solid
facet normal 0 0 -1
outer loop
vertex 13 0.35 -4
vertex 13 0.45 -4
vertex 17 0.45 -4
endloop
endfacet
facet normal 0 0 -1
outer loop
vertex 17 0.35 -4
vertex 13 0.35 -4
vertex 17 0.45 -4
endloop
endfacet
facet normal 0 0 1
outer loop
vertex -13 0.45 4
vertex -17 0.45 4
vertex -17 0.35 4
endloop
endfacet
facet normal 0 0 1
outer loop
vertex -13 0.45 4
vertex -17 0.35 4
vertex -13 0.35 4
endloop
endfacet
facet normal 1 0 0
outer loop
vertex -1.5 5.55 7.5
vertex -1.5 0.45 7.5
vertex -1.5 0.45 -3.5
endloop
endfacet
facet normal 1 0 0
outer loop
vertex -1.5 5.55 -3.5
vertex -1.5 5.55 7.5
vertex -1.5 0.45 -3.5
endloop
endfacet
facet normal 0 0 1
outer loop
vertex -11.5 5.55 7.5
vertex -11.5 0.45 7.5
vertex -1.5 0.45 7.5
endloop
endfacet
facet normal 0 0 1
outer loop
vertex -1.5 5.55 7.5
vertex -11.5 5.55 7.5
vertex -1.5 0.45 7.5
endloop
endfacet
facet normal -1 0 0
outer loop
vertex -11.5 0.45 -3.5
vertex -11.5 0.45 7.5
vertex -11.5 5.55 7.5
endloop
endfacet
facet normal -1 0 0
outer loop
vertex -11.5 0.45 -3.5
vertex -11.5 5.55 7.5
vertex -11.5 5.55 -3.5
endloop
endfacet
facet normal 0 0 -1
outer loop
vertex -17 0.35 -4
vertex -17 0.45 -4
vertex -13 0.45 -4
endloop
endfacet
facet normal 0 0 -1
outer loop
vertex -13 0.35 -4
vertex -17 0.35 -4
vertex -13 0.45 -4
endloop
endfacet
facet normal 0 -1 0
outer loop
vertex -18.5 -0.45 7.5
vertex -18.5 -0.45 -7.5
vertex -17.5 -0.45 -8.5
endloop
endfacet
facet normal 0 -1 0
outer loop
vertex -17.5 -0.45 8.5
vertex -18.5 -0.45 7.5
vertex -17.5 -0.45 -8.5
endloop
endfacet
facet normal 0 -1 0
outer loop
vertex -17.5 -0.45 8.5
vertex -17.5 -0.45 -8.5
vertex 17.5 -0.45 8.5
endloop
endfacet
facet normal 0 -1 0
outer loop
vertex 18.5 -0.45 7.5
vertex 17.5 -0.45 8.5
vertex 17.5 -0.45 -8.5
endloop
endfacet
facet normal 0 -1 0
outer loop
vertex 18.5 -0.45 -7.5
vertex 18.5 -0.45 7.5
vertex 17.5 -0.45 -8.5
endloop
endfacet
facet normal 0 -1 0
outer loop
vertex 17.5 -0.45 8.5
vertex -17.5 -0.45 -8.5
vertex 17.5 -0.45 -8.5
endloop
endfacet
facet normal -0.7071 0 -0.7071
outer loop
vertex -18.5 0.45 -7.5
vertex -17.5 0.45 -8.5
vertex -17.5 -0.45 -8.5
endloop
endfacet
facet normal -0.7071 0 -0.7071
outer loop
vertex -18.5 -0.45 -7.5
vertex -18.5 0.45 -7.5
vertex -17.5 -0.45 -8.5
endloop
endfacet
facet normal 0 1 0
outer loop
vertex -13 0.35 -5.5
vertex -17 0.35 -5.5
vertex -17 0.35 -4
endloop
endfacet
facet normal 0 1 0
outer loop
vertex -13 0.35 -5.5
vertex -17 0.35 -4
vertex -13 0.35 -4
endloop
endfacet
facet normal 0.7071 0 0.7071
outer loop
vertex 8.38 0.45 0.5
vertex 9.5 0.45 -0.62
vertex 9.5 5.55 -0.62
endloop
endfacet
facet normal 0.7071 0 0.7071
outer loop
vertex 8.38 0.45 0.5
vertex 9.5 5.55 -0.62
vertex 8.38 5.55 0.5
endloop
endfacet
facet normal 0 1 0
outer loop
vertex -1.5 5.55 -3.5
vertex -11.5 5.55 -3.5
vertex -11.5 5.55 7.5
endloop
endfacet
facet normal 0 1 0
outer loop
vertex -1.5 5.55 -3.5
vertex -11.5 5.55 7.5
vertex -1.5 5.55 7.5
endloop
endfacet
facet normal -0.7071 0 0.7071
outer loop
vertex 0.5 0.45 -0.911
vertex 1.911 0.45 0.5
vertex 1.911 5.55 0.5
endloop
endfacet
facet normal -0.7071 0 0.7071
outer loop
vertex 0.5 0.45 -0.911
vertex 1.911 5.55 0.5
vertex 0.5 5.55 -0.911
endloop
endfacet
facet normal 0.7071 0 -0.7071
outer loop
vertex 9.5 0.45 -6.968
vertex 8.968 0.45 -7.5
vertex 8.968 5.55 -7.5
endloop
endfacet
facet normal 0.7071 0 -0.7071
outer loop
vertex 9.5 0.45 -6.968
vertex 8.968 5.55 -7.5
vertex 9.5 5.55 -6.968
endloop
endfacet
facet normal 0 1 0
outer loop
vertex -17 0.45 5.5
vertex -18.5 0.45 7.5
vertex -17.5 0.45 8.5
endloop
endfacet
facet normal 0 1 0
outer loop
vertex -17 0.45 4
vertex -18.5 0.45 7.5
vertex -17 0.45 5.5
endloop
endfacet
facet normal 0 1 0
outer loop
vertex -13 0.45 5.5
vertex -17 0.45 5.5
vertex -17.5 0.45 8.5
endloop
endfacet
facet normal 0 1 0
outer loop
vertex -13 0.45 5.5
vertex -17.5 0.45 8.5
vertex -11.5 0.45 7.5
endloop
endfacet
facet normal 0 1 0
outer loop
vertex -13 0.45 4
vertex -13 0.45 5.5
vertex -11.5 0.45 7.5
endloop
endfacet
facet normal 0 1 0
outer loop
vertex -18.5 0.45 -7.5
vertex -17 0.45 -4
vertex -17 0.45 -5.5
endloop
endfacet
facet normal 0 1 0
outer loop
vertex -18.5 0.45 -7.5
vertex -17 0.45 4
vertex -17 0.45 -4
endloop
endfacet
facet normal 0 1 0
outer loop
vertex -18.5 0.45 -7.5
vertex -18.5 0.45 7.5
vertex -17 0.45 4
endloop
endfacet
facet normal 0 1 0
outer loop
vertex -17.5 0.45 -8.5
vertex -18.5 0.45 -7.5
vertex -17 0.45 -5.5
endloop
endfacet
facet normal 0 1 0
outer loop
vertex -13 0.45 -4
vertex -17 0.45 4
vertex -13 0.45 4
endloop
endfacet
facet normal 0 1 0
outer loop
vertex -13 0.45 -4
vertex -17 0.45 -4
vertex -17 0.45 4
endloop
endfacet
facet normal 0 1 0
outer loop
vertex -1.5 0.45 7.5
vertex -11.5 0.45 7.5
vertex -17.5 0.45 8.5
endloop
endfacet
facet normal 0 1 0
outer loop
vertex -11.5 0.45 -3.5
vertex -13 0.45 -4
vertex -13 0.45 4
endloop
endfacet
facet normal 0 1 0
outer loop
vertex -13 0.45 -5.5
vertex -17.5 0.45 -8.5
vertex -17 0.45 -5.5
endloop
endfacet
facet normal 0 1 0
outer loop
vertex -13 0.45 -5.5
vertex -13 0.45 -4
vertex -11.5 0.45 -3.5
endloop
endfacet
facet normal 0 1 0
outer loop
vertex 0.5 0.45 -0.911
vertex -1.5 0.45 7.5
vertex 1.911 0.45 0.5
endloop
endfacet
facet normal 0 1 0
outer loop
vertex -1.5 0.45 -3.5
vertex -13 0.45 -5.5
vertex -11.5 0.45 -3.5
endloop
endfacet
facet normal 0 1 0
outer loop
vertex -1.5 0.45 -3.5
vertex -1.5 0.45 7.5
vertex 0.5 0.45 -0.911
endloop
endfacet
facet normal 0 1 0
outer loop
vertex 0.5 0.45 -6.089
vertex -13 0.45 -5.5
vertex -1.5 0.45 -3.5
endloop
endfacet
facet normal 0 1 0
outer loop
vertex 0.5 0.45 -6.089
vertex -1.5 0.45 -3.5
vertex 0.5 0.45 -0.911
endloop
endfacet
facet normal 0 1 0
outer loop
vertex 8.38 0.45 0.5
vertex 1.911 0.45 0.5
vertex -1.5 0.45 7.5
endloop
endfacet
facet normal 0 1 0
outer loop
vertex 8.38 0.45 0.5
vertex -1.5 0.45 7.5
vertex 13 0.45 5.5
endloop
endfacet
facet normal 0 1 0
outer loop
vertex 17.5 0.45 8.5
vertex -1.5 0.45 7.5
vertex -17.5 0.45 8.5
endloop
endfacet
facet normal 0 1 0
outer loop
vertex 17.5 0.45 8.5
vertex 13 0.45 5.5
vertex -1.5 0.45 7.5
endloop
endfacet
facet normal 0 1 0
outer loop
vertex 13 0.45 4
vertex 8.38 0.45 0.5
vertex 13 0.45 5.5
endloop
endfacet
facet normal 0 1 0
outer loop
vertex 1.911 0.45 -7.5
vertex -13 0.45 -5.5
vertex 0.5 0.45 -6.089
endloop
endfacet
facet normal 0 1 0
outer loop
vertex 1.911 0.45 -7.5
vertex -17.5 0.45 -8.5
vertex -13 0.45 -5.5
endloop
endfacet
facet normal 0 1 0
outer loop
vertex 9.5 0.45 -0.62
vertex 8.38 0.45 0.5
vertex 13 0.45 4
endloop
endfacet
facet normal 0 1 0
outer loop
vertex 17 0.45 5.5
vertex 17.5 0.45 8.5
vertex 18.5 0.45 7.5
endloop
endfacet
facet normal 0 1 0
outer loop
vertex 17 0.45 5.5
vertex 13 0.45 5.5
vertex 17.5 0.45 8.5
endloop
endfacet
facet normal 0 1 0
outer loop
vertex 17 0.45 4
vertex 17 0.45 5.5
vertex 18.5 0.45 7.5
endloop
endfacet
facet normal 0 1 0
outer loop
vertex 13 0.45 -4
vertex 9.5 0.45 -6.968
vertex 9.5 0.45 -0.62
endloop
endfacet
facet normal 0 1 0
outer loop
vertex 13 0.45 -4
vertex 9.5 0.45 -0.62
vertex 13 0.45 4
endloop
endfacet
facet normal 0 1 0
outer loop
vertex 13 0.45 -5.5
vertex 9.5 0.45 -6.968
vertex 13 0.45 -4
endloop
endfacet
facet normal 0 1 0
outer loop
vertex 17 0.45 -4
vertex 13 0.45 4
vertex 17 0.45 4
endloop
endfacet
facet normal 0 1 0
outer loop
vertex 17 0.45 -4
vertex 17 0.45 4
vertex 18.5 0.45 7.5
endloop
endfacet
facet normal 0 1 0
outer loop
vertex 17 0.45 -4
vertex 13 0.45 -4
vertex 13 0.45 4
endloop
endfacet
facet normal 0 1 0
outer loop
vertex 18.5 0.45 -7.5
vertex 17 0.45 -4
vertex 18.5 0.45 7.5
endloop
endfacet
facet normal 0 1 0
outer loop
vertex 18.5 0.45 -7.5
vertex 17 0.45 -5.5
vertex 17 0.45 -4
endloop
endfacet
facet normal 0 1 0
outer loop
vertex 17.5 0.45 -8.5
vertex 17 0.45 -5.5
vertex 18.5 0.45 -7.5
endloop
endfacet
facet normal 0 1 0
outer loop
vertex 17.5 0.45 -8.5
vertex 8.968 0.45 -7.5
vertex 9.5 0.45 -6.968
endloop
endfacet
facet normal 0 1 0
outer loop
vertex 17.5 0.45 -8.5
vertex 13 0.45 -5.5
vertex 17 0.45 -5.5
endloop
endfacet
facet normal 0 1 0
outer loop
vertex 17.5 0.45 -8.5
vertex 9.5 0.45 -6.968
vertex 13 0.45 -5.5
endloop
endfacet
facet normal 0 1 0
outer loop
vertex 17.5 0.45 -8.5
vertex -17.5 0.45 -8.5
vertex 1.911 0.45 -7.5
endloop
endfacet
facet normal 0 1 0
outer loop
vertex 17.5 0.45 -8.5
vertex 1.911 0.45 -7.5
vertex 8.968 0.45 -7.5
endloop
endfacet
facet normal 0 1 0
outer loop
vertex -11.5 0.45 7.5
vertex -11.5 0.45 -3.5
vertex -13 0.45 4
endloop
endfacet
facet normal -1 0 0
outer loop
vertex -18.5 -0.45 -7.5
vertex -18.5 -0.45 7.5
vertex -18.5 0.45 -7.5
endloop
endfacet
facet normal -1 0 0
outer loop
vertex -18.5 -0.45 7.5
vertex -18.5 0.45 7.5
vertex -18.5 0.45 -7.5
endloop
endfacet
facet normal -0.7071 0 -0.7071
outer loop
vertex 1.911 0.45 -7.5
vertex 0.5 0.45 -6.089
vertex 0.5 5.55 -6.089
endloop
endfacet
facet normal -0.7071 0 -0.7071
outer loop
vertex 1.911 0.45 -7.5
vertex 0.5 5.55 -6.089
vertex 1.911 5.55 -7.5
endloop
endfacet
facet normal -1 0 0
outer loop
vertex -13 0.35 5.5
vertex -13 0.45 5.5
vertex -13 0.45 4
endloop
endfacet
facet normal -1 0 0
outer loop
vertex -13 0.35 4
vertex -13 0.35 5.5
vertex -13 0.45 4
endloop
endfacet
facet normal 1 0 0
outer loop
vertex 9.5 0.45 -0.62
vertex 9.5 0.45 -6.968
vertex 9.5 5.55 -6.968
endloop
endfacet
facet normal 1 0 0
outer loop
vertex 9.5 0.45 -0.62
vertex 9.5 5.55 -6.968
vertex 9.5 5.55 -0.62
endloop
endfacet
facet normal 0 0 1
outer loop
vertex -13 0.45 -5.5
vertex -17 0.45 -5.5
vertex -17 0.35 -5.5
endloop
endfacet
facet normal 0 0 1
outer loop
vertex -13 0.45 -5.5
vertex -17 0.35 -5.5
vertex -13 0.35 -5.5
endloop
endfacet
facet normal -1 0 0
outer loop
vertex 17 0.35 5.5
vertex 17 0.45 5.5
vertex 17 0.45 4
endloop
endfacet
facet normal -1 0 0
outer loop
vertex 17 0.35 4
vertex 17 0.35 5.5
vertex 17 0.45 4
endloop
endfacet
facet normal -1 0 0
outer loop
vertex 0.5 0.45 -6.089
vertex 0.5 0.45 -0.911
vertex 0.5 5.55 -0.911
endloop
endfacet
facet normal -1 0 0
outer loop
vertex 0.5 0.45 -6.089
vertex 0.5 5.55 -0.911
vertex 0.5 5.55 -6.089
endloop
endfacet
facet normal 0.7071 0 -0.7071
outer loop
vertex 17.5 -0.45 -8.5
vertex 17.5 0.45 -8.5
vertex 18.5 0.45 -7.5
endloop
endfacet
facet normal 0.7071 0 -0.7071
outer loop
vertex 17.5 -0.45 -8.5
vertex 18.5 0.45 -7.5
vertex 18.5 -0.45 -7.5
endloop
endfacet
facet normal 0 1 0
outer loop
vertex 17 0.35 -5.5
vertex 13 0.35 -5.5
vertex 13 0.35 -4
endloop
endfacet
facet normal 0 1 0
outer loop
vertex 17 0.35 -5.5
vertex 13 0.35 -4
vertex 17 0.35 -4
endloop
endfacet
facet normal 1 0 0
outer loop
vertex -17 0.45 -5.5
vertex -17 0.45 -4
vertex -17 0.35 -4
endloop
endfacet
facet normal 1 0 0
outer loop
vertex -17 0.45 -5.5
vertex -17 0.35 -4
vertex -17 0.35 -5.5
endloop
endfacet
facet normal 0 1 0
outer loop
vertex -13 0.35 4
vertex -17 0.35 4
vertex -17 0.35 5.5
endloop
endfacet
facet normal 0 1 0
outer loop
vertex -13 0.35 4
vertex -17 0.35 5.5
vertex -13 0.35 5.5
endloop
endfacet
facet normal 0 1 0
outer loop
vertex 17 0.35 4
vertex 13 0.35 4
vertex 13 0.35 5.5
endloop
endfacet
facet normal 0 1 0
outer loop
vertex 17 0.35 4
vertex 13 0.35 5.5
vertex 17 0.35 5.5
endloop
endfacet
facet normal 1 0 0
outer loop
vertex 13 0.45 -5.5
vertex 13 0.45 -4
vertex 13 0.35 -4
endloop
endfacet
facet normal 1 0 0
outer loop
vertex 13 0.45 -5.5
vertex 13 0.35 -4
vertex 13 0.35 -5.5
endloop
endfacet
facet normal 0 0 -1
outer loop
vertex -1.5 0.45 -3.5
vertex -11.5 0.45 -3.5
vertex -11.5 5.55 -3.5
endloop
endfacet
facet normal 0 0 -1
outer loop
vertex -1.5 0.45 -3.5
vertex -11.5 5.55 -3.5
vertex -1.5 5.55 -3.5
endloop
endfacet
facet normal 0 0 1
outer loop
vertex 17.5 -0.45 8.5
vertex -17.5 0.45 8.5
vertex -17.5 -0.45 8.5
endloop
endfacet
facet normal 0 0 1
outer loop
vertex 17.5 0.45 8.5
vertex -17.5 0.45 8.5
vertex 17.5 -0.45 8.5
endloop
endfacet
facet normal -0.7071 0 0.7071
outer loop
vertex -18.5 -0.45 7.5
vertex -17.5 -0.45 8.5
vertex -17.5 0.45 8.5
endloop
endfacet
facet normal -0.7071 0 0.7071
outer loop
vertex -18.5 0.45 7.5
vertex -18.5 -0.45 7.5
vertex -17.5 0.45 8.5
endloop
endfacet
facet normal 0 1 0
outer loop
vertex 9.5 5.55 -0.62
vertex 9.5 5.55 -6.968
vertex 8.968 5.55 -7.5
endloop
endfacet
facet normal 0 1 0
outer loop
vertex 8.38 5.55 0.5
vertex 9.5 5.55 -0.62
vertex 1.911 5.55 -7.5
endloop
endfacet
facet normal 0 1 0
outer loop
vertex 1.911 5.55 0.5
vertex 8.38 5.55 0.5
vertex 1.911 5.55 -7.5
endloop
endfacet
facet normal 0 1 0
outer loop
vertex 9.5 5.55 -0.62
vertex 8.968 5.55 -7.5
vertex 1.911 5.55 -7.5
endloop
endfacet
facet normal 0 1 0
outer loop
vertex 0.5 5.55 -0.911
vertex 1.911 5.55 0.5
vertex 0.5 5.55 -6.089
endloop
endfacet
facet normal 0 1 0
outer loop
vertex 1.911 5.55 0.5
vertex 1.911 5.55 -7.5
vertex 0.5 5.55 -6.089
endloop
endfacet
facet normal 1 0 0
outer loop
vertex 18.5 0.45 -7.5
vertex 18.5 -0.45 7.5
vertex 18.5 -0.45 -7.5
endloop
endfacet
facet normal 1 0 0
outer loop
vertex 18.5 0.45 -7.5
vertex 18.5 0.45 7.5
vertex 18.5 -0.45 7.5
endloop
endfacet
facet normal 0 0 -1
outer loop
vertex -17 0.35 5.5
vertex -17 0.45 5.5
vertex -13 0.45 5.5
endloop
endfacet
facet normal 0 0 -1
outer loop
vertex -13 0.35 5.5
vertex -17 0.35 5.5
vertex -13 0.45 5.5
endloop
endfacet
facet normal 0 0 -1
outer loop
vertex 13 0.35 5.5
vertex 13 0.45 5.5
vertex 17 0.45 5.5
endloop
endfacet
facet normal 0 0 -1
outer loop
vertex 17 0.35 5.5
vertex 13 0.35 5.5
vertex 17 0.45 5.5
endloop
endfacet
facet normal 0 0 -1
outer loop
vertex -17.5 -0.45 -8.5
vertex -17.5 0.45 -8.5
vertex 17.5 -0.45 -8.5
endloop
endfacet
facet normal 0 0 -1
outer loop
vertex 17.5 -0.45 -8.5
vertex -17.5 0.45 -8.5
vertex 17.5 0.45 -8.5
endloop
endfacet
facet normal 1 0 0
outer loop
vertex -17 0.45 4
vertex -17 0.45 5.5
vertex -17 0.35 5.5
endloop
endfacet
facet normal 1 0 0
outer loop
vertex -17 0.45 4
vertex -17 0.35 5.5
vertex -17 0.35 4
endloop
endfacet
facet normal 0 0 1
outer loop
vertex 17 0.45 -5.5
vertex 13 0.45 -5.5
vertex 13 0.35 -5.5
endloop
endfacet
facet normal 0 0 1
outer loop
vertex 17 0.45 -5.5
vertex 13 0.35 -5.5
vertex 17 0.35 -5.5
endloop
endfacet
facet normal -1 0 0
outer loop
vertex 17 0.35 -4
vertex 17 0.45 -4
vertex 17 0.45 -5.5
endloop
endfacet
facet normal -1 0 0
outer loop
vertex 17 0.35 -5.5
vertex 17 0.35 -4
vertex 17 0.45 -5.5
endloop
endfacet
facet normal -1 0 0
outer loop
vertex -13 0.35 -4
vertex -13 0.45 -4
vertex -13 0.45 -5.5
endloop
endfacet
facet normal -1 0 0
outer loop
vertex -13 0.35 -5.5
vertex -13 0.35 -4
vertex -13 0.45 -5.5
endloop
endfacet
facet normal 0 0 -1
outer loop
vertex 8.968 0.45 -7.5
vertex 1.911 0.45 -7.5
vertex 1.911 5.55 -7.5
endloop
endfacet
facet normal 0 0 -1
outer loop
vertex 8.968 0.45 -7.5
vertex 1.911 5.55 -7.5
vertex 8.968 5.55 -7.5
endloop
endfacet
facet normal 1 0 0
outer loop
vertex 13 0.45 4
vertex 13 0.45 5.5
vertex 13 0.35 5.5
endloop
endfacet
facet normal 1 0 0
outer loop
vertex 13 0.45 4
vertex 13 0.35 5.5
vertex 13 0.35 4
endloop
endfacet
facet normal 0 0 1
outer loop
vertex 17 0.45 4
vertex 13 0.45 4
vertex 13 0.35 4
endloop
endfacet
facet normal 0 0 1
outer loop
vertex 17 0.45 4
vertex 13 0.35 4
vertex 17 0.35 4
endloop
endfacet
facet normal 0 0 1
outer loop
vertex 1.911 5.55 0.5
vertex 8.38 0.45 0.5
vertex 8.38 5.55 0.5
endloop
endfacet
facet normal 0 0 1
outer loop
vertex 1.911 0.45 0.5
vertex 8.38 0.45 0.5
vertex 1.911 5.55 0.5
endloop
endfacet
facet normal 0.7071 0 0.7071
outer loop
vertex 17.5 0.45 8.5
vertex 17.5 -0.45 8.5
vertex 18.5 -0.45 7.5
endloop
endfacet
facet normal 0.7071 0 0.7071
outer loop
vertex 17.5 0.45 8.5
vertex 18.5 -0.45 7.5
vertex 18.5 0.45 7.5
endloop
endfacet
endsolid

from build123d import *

# Parameters (mm, degrees)
ESBO_O1_W                = 37
ESBO_O1_H                = 17
RESSALTO_EXTRUS_O1_DEPTH = 0.45
ESBO_O2_W                = 10
ESBO_O2_H                = 11
RESSALTO_EXTRUS_O2_DEPTH = 5.1
RESSALTO_EXTRUS_O3_DEPTH = 5.1
ESBO_O4_W                = 4
ESBO_O4_H                = 1.5
CORTE_EXTRUS_O1_DEPTH    = 0.1
CHANFRO1_SIZE            = 1


with BuildPart() as part:
    # Esboço1 → Ressalto-extrusão1 (new, symmetric)
    with BuildSketch(Plane(origin=(0, 0, 0), x_dir=(1, 0, 0), z_dir=(0, 1, 0))):
        Rectangle(ESBO_O1_W, ESBO_O1_H)
    extrude(amount=RESSALTO_EXTRUS_O1_DEPTH, both=True)

    # Esboço2 → Ressalto-extrusão2 (add)
    with BuildSketch(Plane(origin=(0, 0.45, 0), x_dir=(1, 0, 0), z_dir=(0, 1, 0))):
        with Locations((-6.5, -2)):
            Rectangle(ESBO_O2_W, ESBO_O2_H)
    extrude(amount=RESSALTO_EXTRUS_O2_DEPTH)

    # Esboço3 → Ressalto-extrusão3 (add)
    with BuildSketch(Plane(origin=(0, 0.45, 0), x_dir=(1, 0, 0), z_dir=(0, 1, 0))):
        Polygon((0.5, 0.910833496), (0.5, 6.089166504), (1.910833496, 7.5), (8.967936907, 7.5), (9.5, 6.967936907), (9.5, 0.62041406), (8.37958594, -0.5), (1.910833496, -0.5), align=None)
    extrude(amount=RESSALTO_EXTRUS_O3_DEPTH)

    # Esboço4 → Corte-extrusão1 (cut)
    with BuildSketch(Plane(origin=(0, 0.45, 0), x_dir=(1, 0, 0), z_dir=(0, 1, 0))):
        with Locations((-15, 4.75)):
            Rectangle(ESBO_O4_W, ESBO_O4_H)
        with Locations((-15, -4.75)):
            Rectangle(ESBO_O4_W, ESBO_O4_H)
        with Locations((15, -4.75)):
            Rectangle(ESBO_O4_W, ESBO_O4_H)
        with Locations((15, 4.75)):
            Rectangle(ESBO_O4_W, ESBO_O4_H)
    extrude(amount=-CORTE_EXTRUS_O1_DEPTH, mode=Mode.SUBTRACT)

    # Chanfro1
    chanfro1_edges = [part.edges().sort_by_distance(p)[0] for p in [
        (-18.5, 0, -8.5),
        (18.5, 0, -8.5),
        (18.5, 0, 8.5),
        (-18.5, 0, 8.5),
    ]]
    chamfer(chanfro1_edges, length=CHANFRO1_SIZE)


solid = part.part
